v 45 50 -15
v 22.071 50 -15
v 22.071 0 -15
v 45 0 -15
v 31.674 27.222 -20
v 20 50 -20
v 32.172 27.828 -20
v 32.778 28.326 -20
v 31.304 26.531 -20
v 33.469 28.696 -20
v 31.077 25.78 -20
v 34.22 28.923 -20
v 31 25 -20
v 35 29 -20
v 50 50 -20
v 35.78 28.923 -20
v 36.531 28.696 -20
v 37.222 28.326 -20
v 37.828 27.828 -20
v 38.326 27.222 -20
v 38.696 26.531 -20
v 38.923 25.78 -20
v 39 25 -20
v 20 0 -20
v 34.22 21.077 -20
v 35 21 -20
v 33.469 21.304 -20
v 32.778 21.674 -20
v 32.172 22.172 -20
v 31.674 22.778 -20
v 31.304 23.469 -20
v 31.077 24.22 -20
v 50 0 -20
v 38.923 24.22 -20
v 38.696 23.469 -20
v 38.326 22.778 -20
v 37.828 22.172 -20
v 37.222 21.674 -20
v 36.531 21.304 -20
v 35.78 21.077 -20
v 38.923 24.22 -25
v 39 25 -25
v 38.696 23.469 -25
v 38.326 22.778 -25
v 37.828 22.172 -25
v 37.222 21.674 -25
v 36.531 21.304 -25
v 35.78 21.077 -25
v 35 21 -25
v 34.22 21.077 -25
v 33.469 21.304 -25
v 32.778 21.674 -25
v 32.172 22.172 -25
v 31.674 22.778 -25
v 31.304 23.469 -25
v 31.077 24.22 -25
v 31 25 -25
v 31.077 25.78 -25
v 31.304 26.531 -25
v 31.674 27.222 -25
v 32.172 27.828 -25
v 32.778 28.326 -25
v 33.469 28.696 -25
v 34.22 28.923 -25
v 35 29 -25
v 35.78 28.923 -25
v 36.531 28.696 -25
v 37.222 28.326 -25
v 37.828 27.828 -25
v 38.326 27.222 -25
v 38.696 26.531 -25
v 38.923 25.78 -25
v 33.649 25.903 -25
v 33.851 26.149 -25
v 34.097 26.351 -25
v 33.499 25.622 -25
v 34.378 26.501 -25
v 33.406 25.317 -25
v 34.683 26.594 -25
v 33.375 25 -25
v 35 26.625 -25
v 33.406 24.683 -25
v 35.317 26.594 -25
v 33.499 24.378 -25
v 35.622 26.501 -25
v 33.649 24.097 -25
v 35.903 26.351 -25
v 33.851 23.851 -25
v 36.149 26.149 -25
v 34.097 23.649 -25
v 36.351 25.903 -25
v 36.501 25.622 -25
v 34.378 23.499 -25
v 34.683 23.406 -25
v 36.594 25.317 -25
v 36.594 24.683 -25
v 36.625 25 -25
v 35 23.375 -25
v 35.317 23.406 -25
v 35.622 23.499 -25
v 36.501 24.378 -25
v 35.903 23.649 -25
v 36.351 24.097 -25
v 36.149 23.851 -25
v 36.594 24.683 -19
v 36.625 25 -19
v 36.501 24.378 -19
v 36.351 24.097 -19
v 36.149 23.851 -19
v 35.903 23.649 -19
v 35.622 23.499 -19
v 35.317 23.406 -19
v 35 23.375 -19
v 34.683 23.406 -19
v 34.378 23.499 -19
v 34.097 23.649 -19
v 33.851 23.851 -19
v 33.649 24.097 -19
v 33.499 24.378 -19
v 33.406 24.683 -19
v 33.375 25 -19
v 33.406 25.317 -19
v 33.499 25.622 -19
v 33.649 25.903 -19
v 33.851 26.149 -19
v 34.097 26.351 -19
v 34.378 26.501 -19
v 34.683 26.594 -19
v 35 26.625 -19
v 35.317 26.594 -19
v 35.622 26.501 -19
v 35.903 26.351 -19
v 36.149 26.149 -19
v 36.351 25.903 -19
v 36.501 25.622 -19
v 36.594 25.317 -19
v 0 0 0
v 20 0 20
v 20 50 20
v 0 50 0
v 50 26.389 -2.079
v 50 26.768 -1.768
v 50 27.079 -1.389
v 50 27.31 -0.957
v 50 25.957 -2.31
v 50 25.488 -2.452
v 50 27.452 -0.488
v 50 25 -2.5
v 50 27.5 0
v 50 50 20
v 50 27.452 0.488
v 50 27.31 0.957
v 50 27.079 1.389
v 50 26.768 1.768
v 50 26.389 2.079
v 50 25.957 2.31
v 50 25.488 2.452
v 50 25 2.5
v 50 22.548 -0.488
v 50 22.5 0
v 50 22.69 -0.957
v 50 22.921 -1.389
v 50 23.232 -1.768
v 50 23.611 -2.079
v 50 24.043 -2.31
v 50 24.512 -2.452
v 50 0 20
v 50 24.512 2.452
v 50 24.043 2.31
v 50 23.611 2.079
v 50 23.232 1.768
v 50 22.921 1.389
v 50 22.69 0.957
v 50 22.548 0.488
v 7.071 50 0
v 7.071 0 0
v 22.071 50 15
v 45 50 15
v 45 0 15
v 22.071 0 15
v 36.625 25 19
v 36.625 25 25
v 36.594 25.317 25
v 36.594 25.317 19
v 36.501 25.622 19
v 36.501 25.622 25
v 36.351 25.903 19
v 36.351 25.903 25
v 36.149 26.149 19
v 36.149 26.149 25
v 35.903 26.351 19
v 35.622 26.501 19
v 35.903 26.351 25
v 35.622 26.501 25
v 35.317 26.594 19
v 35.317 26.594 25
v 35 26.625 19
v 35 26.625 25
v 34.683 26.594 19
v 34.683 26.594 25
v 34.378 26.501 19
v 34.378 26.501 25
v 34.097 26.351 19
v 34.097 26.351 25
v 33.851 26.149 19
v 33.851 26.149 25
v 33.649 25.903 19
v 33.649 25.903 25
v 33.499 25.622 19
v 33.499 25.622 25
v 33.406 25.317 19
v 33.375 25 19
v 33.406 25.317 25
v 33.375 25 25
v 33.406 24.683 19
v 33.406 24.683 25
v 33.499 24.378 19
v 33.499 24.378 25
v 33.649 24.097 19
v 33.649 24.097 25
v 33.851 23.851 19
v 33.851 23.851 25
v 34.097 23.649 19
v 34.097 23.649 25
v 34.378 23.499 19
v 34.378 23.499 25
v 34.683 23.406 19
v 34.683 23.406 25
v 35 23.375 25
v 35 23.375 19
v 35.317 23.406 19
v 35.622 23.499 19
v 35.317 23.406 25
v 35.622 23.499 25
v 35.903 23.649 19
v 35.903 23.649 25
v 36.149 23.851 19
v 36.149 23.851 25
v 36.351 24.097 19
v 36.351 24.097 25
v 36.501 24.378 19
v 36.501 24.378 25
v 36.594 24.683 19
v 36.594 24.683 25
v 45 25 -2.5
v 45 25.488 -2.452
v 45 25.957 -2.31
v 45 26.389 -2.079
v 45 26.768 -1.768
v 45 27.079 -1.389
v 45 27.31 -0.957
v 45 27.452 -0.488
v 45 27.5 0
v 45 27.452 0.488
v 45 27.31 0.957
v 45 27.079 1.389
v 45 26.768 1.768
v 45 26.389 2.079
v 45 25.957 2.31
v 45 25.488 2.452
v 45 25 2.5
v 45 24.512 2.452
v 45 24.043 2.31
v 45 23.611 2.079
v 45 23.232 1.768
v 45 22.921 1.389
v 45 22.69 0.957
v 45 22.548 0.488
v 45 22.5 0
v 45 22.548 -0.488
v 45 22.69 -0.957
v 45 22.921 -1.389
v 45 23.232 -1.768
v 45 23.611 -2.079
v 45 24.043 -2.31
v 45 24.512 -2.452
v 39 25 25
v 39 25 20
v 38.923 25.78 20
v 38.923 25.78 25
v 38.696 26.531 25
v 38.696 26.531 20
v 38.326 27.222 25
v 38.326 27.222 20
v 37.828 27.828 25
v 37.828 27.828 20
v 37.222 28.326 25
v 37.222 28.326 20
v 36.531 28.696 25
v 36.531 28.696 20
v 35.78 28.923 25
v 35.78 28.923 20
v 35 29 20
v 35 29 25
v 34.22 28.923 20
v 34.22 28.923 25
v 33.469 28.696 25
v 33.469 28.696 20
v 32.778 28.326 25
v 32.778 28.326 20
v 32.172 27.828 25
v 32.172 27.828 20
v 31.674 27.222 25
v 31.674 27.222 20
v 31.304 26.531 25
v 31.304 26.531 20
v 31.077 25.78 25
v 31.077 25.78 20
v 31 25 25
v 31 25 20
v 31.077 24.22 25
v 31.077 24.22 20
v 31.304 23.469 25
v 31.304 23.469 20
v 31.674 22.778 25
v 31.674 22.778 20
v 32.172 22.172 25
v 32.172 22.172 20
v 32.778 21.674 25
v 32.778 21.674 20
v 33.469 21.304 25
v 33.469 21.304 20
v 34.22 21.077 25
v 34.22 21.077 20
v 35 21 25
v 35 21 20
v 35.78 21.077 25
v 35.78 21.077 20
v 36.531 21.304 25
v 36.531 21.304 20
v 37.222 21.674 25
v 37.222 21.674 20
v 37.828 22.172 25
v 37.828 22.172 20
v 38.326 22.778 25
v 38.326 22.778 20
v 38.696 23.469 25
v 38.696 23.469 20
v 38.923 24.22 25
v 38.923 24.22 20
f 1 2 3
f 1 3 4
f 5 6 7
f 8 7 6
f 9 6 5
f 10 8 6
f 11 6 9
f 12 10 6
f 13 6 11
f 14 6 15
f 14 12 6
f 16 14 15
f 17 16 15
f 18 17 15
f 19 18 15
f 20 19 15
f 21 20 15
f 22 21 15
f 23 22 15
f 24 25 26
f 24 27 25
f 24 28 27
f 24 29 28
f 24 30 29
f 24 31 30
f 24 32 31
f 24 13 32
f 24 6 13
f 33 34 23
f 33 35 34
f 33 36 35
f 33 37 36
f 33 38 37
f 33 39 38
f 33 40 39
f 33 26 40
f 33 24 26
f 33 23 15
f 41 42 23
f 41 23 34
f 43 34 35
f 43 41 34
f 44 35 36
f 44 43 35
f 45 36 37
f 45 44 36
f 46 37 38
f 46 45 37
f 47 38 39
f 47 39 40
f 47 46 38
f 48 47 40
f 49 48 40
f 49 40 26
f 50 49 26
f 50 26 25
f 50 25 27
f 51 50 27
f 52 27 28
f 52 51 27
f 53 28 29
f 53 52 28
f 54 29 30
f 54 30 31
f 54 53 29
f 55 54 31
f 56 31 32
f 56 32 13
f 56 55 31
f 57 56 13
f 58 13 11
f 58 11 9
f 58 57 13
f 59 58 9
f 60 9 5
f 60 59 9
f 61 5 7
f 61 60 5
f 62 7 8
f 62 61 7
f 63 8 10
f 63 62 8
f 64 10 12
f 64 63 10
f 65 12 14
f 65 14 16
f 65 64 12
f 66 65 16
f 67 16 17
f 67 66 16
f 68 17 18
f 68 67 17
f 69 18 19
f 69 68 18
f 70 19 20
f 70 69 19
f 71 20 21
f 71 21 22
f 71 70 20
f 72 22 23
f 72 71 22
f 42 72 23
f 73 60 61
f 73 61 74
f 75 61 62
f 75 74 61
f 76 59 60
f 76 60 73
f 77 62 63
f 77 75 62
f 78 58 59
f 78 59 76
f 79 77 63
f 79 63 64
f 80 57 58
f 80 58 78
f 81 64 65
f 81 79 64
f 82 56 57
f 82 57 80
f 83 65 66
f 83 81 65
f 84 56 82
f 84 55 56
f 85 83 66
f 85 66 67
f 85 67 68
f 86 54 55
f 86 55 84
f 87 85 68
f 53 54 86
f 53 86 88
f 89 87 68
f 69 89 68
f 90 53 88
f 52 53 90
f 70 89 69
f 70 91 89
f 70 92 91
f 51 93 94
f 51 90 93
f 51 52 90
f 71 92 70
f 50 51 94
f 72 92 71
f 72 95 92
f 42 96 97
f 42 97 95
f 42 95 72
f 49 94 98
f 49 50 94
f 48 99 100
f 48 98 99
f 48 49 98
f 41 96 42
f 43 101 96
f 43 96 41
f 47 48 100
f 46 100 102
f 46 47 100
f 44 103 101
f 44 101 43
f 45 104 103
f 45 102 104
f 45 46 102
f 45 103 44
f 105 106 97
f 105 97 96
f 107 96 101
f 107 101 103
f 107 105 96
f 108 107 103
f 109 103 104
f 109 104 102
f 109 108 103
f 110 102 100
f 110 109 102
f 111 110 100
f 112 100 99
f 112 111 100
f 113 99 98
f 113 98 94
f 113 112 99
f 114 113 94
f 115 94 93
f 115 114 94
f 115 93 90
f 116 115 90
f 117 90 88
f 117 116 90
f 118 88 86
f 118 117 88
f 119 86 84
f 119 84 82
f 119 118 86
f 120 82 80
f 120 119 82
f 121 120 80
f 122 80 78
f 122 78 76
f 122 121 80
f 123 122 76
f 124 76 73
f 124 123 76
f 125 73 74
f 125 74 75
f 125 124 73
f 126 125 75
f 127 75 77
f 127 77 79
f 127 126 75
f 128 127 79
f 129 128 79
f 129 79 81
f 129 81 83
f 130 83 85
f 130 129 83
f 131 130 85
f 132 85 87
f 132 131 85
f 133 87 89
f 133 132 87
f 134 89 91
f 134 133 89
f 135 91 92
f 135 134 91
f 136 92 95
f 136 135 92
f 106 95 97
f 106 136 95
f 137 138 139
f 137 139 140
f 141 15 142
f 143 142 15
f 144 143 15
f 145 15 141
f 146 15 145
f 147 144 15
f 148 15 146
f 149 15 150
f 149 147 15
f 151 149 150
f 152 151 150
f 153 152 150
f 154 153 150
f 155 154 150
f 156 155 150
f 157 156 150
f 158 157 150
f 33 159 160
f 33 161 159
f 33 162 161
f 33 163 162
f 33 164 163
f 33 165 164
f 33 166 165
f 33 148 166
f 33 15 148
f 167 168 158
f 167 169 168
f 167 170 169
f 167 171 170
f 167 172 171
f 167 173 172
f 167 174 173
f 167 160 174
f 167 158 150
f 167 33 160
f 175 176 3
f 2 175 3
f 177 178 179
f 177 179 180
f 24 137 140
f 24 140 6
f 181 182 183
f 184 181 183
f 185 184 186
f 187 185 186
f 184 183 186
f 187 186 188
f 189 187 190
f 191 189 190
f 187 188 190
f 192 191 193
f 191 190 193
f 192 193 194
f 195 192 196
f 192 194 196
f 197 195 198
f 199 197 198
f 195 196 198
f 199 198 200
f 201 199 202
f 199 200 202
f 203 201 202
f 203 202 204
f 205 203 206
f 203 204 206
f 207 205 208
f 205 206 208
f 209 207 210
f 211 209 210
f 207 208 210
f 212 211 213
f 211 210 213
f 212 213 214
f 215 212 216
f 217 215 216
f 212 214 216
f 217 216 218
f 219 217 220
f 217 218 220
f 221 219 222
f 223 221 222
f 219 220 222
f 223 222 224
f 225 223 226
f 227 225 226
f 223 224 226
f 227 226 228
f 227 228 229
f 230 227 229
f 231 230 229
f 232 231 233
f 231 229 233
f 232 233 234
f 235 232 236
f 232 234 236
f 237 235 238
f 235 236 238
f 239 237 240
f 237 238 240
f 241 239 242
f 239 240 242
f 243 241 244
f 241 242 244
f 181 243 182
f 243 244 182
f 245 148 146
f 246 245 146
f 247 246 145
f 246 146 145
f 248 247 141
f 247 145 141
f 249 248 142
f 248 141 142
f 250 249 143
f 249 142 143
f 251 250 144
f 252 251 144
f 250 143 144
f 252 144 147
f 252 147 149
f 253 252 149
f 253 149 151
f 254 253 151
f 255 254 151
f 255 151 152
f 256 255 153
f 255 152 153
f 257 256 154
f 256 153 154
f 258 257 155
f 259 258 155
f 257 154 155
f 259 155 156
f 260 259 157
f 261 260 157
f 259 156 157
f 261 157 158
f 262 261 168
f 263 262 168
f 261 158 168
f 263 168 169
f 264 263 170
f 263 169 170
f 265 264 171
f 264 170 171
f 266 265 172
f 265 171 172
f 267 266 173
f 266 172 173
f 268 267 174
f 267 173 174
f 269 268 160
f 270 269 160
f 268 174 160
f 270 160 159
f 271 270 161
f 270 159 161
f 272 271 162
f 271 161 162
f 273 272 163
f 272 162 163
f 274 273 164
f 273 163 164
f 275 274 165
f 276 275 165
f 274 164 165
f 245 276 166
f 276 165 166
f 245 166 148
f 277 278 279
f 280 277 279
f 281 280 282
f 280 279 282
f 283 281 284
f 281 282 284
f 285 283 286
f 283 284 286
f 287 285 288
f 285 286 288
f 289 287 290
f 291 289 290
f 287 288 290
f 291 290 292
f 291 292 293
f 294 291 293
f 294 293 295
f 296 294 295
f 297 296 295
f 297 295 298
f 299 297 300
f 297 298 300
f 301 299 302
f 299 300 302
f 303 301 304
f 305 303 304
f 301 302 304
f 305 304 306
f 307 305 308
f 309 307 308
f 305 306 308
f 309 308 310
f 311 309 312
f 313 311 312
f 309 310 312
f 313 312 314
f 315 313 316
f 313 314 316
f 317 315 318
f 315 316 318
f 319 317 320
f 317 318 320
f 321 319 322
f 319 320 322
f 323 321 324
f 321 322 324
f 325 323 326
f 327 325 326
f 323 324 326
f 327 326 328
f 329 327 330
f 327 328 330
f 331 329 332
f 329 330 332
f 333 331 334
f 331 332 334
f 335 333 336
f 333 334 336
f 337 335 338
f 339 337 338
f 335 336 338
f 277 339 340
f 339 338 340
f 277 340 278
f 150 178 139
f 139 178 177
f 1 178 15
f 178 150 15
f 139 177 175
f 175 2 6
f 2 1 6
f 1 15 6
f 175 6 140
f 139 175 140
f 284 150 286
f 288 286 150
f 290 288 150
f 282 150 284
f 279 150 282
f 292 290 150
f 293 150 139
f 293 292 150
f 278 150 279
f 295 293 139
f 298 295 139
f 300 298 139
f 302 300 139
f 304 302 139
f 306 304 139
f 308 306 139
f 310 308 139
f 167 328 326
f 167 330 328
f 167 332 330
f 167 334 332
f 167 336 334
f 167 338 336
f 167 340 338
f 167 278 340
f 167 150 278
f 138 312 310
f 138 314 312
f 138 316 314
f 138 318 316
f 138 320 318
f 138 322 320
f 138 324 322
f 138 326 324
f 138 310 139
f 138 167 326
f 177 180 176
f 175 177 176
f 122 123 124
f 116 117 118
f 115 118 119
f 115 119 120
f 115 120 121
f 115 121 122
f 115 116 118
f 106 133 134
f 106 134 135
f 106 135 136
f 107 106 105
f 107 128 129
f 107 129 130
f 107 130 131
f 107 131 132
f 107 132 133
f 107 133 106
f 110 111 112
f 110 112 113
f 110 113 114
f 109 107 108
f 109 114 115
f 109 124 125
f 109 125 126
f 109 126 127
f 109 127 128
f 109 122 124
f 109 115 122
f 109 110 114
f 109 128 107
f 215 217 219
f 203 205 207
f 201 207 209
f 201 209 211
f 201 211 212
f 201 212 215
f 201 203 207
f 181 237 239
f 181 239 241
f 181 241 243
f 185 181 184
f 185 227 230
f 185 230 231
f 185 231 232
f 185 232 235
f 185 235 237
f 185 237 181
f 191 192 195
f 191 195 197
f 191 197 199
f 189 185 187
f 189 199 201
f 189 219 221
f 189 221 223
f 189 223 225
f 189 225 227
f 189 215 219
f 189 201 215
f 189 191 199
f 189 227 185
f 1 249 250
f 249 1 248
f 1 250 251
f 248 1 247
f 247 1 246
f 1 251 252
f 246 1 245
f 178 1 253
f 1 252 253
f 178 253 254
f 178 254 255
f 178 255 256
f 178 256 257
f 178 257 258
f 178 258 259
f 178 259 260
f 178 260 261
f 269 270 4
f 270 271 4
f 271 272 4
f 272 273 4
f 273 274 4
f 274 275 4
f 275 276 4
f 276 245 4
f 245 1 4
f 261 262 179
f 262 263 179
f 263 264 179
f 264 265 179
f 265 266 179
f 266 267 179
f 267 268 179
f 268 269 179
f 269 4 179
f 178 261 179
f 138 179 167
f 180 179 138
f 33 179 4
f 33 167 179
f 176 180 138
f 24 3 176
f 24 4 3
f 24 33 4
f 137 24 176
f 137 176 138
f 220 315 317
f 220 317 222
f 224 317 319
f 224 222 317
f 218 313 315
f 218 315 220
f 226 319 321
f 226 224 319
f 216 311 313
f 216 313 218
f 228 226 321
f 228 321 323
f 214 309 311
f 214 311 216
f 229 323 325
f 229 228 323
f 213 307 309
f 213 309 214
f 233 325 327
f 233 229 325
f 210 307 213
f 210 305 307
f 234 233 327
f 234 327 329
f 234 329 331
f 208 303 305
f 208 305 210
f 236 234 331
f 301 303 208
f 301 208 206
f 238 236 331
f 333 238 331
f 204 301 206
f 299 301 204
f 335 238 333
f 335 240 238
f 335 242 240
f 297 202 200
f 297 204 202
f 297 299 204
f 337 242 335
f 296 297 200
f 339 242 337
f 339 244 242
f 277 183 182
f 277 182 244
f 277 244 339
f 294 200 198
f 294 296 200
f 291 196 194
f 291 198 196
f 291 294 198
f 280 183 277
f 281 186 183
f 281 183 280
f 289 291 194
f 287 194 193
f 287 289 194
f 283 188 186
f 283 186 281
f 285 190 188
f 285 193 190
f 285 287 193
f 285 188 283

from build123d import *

# Parameters (mm, degrees)
SALIENTE_EXTRUIR1_DEPTH = 50
CROQUIS7_R              = 2.5
CORTAR_EXTRUIR1_DEPTH   = 5
CROQUIS8_R              = 4
SALIENTE_EXTRUIR2_DEPTH = 5
SALIENTE_EXTRUIR3_START = 5
CROQUIS15_R             = 4
SALIENTE_EXTRUIR3_DEPTH = 5
CROQUIS17_R             = 1.625
CORTAR_EXTRUIR4_DEPTH   = 6
CORTAR_EXTRUIR5_START   = -6
CROQUIS16_R             = 1.625
CORTAR_EXTRUIR5_DEPTH   = 6


with BuildPart() as part:
    # Croquis3 → Saliente-Extruir1 (new body)
    with BuildSketch(Plane(origin=(0, 0, 0), x_dir=(1, 0, 0), z_dir=(0, 1, 0))):
        Polygon((0, 0), (20.000000004, 20), (50.000000004, 20), (50.000000004, -20), (20.000000004, -20), align=None)
        Polygon((7.071067811, 2e-09), (22.071067819, 15), (45.000000004, 15), (45.000000004, -15), (22.071067815, -15), align=None, mode=Mode.SUBTRACT)
    extrude(amount=SALIENTE_EXTRUIR1_DEPTH)

    # Croquis7 → Cortar-Extruir1 (cut)
    with BuildSketch(Plane(origin=(50.000000004, 0, 0), x_dir=(0, 0, -1), z_dir=(1, 0, 0))):
        with Locations((0, 25)):
            Circle(CROQUIS7_R)
    extrude(amount=-CORTAR_EXTRUIR1_DEPTH, mode=Mode.SUBTRACT)

    # Croquis8 → Saliente-Extruir2 (add)
    with BuildSketch(Plane.XY.offset(20)):
        with Locations((35.000000004, 25)):
            Circle(CROQUIS8_R)
    extrude(amount=SALIENTE_EXTRUIR2_DEPTH)

    # Croquis15 → Saliente-Extruir3 (add)
    with BuildSketch(Plane(origin=(0, 0, -20), x_dir=(-1, 0, 0), z_dir=(0, 0, -1)).offset(SALIENTE_EXTRUIR3_START)):
        with Locations(Location((-35.000000004, 25, 0), (0, 0, 180))):
            Circle(CROQUIS15_R)
    extrude(amount=-SALIENTE_EXTRUIR3_DEPTH)

    # Croquis17 → Cortar-Extruir4 (cut)
    with BuildSketch(Plane.XY.offset(25)):
        with Locations((35.000000004, 25)):
            Circle(CROQUIS17_R)
    extrude(amount=-CORTAR_EXTRUIR4_DEPTH, mode=Mode.SUBTRACT)

    # Croquis16 → Cortar-Extruir5 (cut)
    with BuildSketch(Plane(origin=(0, 0, -25), x_dir=(-1, 0, 0), z_dir=(0, 0, -1)).offset(CORTAR_EXTRUIR5_START)):
        with Locations(Location((-35.000000004, 25, 0), (0, 0, 180))):
            Circle(CROQUIS16_R)
    extrude(amount=CORTAR_EXTRUIR5_DEPTH, mode=Mode.SUBTRACT)


solid = part.part
